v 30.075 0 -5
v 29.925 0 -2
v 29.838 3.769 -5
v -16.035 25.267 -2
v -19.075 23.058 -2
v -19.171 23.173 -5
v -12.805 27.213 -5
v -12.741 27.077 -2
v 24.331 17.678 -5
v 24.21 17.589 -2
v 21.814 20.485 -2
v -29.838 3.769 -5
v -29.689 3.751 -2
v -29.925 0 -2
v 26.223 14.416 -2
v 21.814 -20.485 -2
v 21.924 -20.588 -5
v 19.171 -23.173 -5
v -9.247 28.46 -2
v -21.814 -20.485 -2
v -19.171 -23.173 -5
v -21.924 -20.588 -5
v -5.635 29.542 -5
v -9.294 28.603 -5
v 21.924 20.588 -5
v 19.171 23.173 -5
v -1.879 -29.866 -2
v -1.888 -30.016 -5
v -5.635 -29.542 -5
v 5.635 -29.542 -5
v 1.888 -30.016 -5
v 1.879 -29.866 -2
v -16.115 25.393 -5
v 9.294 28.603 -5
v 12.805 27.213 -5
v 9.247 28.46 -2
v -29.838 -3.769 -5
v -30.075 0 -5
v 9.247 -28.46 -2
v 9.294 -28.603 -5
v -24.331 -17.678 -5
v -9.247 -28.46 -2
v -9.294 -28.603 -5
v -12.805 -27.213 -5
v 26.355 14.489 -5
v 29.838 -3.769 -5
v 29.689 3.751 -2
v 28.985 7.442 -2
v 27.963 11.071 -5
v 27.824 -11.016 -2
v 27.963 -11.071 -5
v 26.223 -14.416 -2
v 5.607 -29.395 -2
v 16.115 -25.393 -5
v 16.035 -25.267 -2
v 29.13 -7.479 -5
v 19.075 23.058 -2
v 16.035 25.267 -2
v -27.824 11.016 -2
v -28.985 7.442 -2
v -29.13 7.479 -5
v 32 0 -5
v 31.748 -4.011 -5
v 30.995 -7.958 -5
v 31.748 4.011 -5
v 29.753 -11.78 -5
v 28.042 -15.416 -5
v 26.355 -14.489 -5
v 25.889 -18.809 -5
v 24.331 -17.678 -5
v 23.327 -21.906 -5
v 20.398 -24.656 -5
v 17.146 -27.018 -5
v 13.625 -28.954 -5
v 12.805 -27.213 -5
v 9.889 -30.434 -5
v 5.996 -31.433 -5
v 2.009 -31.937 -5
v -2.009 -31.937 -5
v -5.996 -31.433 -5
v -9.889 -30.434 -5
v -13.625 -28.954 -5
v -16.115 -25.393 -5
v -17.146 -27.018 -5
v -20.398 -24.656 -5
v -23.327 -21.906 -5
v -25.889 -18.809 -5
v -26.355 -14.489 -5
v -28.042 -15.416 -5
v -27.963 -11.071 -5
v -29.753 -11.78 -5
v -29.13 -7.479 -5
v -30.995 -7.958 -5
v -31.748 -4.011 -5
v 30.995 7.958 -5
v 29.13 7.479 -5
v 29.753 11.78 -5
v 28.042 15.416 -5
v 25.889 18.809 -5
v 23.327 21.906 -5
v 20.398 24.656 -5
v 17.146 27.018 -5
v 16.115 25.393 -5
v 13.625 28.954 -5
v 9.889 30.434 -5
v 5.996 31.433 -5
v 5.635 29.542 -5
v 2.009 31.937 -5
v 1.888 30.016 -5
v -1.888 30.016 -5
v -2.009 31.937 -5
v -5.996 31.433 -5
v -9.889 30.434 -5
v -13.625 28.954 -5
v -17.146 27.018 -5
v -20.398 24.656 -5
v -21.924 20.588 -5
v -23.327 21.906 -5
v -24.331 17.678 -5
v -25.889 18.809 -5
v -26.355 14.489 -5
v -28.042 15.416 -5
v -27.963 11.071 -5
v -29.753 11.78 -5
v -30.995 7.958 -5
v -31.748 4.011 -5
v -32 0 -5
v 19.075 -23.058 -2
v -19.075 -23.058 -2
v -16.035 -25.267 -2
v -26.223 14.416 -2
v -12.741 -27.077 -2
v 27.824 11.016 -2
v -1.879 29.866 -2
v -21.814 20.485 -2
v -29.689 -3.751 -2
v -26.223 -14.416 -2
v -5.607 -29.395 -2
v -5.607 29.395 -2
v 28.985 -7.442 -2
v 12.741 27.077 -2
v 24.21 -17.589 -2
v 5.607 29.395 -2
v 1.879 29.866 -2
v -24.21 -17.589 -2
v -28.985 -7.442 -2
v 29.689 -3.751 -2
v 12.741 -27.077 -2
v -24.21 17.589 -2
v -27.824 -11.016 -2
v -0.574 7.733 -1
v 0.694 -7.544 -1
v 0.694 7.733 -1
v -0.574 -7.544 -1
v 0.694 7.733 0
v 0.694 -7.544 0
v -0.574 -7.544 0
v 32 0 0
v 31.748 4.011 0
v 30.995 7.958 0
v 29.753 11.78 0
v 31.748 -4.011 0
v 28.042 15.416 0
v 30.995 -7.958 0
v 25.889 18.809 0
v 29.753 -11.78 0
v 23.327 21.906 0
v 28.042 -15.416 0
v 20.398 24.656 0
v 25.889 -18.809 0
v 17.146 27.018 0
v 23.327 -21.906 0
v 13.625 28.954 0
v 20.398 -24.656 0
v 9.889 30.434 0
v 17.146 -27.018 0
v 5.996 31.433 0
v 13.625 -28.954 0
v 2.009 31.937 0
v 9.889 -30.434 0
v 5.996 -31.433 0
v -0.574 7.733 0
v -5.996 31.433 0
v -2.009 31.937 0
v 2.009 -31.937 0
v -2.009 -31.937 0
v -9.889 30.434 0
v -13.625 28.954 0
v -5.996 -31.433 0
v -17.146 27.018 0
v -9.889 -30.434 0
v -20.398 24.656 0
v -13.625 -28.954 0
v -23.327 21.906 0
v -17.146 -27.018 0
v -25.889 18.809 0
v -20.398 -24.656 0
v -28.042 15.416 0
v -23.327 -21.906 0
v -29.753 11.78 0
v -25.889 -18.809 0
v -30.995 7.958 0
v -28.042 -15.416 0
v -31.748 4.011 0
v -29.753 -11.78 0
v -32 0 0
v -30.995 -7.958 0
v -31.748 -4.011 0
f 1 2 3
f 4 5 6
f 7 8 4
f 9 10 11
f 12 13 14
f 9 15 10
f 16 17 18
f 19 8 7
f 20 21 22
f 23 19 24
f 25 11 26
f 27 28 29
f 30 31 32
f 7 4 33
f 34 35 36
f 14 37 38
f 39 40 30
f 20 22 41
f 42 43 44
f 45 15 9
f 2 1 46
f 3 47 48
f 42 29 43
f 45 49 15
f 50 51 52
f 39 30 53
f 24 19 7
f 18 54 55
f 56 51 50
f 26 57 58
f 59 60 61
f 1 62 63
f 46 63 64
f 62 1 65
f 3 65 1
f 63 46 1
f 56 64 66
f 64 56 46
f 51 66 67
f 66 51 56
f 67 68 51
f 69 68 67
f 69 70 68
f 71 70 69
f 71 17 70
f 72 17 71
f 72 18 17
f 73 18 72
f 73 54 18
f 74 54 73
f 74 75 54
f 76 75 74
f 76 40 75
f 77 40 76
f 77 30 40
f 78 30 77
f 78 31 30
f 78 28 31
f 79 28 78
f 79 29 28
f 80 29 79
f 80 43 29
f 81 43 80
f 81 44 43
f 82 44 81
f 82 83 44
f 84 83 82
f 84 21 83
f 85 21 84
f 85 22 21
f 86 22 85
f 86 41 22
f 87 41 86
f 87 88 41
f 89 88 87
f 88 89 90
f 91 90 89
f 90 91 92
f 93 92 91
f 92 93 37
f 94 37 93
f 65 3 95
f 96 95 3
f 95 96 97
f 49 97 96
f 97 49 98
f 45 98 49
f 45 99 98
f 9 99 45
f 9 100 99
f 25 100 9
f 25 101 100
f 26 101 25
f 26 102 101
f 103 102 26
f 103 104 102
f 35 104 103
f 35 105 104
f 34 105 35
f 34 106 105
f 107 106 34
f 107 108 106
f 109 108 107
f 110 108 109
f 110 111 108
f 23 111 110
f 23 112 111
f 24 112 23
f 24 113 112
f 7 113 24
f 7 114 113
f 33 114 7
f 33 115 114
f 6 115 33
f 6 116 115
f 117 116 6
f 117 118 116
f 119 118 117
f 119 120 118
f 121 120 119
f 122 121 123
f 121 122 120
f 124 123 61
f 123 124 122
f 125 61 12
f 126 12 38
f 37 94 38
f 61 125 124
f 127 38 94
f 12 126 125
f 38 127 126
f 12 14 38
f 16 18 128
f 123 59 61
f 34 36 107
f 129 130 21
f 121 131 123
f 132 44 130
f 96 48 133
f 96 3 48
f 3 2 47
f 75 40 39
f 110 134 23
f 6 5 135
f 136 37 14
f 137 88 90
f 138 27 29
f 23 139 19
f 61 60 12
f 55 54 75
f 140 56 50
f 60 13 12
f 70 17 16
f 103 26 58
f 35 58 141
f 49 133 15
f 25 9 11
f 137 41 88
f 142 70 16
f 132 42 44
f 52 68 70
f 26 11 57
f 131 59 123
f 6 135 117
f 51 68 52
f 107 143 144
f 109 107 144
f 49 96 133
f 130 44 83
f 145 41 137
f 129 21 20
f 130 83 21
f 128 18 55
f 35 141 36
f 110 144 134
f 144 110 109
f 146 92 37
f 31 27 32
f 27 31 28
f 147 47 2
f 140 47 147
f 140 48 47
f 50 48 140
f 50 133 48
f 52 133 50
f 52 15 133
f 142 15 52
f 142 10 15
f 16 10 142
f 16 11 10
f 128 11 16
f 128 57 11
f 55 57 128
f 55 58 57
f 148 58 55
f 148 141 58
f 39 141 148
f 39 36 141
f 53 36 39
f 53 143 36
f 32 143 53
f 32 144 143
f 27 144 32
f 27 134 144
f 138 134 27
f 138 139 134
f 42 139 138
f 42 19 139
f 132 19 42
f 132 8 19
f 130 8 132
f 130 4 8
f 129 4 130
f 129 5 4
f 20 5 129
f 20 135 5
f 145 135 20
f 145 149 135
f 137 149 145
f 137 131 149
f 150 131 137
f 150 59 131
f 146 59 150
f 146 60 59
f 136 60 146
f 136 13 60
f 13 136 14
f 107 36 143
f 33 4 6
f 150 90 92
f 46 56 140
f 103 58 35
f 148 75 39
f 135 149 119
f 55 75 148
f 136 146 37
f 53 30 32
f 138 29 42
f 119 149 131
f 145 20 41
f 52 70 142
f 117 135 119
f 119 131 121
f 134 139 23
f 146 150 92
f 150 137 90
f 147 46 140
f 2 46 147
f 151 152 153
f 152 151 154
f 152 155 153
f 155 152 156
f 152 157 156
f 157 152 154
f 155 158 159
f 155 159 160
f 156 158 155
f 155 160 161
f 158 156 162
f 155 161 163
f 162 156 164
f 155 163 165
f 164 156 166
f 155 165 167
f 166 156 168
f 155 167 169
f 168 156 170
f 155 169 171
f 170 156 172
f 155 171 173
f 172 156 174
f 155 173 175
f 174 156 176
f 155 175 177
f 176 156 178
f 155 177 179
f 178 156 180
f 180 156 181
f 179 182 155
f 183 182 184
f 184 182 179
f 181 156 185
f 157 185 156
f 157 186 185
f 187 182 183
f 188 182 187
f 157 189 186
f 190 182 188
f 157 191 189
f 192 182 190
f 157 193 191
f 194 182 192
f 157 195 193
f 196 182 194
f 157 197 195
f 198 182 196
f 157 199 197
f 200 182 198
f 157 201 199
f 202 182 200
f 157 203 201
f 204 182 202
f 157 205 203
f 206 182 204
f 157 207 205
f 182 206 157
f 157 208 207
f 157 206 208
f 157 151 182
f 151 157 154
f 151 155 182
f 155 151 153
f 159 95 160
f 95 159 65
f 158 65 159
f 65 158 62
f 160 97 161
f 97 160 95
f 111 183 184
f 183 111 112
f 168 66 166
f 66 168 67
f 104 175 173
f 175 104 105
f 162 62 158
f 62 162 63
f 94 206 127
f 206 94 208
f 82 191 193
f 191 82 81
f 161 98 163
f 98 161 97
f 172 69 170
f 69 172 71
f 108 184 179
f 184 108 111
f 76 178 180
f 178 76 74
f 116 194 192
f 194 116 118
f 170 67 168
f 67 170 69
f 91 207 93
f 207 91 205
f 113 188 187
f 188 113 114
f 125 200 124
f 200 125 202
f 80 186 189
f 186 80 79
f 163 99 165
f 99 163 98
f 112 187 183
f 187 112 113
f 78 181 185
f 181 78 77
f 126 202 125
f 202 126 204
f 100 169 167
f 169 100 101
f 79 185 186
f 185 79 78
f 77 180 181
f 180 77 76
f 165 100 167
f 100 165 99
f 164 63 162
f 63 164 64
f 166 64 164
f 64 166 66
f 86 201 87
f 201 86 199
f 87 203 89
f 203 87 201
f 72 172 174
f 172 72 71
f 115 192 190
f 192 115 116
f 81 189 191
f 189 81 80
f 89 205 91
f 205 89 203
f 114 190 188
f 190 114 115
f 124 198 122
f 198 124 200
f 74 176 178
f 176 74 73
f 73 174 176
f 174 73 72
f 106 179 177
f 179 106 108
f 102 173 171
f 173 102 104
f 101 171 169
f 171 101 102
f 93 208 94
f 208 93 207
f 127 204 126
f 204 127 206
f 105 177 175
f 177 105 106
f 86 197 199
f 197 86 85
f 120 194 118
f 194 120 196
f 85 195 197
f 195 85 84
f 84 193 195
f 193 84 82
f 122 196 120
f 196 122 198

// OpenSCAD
$fn = 50;

difference() {
	union() {
		translate(v = [0, 0, -5.0]) {
			cylinder(h = 5, r = 32.0);
		}
	}
	union() {
		#translate(v = [0, 0, -5.0]) {
			cylinder(h = 3, r1 = 30.075, r2 = 29.925);
		}
		translate(v = [0, 0, -1]) {
			linear_extrude(height = 1) {
				text(font = "Wingdings", halign = "center", size = 11, text = "|", valign = "center");
			}
		}
	}
}
